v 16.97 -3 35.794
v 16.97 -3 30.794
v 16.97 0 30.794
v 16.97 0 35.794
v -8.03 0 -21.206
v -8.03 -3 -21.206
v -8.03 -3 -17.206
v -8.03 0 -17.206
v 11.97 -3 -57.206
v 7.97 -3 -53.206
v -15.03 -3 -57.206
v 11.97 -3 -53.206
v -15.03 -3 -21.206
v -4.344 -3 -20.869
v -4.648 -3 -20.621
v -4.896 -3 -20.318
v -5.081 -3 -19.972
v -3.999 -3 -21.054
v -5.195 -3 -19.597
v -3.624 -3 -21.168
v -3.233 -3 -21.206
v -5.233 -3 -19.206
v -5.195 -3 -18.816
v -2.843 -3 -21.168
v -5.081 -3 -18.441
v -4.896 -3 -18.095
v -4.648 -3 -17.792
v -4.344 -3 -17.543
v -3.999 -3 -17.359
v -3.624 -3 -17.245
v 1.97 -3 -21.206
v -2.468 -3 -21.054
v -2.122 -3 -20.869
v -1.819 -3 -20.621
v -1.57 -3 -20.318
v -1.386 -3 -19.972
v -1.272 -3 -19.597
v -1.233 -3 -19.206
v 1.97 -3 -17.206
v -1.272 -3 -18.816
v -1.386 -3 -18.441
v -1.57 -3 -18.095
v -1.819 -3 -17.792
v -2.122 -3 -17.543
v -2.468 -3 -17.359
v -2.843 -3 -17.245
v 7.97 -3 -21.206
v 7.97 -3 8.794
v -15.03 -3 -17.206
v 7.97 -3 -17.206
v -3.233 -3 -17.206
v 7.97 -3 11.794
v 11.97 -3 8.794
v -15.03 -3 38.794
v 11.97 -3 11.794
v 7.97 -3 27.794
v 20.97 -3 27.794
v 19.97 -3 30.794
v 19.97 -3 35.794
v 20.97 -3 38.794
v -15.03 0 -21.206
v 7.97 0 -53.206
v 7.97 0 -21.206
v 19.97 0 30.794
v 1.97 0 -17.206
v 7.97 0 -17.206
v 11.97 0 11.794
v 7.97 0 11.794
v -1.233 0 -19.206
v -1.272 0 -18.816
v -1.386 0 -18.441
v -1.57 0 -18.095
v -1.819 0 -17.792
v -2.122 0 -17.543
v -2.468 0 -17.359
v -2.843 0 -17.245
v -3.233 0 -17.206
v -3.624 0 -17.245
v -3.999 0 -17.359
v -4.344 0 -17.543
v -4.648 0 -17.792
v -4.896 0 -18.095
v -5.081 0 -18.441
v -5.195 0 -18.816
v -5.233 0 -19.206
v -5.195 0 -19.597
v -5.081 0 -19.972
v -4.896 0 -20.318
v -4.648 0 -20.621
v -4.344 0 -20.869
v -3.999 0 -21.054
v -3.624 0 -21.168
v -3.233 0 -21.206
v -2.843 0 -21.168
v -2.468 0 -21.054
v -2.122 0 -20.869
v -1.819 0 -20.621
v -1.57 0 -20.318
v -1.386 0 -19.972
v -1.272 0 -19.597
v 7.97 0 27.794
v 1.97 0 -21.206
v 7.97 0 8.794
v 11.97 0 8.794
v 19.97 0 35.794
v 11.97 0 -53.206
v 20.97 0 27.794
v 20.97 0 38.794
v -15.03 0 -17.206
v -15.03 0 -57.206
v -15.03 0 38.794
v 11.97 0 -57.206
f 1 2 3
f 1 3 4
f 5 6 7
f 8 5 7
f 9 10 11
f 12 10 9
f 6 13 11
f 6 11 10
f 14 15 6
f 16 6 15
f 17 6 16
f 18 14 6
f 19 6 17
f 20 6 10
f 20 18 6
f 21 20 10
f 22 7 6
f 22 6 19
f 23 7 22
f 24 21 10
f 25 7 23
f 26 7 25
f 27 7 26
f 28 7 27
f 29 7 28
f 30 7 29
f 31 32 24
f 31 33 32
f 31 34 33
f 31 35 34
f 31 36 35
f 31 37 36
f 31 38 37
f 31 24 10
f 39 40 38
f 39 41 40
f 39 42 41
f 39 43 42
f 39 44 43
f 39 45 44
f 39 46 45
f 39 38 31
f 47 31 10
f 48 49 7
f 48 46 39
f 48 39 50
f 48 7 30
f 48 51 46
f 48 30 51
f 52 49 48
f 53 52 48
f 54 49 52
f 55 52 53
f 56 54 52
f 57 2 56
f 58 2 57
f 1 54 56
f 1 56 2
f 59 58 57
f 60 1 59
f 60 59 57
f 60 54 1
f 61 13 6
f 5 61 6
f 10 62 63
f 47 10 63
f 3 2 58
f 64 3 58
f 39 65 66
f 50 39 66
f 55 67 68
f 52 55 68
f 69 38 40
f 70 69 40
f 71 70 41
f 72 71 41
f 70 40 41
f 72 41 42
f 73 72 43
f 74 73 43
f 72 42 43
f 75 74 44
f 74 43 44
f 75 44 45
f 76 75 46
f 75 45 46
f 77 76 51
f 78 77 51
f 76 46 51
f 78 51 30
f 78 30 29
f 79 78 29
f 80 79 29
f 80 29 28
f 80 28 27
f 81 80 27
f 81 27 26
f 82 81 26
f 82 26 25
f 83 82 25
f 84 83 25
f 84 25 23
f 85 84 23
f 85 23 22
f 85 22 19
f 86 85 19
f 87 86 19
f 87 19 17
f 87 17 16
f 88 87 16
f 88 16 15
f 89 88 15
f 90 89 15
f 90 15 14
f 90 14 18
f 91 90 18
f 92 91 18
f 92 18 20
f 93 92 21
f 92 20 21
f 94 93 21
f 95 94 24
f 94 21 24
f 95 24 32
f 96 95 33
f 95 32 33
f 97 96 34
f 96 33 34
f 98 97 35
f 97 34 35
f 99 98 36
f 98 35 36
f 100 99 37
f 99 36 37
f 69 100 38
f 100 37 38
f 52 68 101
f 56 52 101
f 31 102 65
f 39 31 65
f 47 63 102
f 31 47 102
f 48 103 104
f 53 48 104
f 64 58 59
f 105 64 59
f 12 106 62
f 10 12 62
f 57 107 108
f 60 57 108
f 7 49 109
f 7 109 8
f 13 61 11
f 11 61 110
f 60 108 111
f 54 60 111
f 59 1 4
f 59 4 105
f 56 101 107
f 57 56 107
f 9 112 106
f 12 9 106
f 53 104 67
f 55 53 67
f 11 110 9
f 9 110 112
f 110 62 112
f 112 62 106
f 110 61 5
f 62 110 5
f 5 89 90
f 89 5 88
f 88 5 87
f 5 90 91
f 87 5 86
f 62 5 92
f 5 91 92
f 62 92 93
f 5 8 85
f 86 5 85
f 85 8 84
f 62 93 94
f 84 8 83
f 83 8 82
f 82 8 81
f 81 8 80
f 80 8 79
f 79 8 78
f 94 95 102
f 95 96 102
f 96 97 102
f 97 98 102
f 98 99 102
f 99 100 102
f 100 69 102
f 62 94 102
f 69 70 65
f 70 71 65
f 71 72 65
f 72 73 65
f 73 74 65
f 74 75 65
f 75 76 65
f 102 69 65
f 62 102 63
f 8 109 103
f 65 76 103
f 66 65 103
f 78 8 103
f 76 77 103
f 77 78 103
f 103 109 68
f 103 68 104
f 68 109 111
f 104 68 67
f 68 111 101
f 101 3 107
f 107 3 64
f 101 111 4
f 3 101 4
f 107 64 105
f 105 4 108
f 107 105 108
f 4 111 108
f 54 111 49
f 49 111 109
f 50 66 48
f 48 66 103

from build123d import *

# Parameters (mm, degrees)
F1_DEPTH = 3
F2_R     = 2
F2_W     = 3
F2_H     = 5
F2_W_2   = 7
F2_H_2   = 4
F3_DEPTH = 25


with BuildPart() as f1:
    # F0 (on Front) → F1 (new body)
    with BuildSketch(Plane.XZ):
        Polygon((20.970293, 38.793614), (-15.029707, 38.793614), (-15.029707, -57.206386), (11.970293, -57.206386), (11.970293, -53.206386), (7.970293, -53.206386), (7.970293, -21.206386), (1.970293, -21.206386), (1.970293, -17.206386), (7.970293, -17.206386), (7.970293, 8.793614), (11.970293, 8.793614), (11.970293, 11.793614), (7.970293, 11.793614), (7.970293, 27.793614), (20.970293, 27.793614), align=None)
    extrude(amount=F1_DEPTH)

    # F2 (on face) → F3 (cut)
    with BuildSketch(Plane.XZ.offset(3)):
        with Locations((-3.233321, -19.206386)):
            Circle(F2_R)
        with Locations((18.470293, 33.293614)):
            Rectangle(F2_W, F2_H)
        with Locations((-11.529707, -19.206386)):
            Rectangle(F2_W_2, F2_H_2)
    extrude(amount=-F3_DEPTH, mode=Mode.SUBTRACT)


solid = f1.part
